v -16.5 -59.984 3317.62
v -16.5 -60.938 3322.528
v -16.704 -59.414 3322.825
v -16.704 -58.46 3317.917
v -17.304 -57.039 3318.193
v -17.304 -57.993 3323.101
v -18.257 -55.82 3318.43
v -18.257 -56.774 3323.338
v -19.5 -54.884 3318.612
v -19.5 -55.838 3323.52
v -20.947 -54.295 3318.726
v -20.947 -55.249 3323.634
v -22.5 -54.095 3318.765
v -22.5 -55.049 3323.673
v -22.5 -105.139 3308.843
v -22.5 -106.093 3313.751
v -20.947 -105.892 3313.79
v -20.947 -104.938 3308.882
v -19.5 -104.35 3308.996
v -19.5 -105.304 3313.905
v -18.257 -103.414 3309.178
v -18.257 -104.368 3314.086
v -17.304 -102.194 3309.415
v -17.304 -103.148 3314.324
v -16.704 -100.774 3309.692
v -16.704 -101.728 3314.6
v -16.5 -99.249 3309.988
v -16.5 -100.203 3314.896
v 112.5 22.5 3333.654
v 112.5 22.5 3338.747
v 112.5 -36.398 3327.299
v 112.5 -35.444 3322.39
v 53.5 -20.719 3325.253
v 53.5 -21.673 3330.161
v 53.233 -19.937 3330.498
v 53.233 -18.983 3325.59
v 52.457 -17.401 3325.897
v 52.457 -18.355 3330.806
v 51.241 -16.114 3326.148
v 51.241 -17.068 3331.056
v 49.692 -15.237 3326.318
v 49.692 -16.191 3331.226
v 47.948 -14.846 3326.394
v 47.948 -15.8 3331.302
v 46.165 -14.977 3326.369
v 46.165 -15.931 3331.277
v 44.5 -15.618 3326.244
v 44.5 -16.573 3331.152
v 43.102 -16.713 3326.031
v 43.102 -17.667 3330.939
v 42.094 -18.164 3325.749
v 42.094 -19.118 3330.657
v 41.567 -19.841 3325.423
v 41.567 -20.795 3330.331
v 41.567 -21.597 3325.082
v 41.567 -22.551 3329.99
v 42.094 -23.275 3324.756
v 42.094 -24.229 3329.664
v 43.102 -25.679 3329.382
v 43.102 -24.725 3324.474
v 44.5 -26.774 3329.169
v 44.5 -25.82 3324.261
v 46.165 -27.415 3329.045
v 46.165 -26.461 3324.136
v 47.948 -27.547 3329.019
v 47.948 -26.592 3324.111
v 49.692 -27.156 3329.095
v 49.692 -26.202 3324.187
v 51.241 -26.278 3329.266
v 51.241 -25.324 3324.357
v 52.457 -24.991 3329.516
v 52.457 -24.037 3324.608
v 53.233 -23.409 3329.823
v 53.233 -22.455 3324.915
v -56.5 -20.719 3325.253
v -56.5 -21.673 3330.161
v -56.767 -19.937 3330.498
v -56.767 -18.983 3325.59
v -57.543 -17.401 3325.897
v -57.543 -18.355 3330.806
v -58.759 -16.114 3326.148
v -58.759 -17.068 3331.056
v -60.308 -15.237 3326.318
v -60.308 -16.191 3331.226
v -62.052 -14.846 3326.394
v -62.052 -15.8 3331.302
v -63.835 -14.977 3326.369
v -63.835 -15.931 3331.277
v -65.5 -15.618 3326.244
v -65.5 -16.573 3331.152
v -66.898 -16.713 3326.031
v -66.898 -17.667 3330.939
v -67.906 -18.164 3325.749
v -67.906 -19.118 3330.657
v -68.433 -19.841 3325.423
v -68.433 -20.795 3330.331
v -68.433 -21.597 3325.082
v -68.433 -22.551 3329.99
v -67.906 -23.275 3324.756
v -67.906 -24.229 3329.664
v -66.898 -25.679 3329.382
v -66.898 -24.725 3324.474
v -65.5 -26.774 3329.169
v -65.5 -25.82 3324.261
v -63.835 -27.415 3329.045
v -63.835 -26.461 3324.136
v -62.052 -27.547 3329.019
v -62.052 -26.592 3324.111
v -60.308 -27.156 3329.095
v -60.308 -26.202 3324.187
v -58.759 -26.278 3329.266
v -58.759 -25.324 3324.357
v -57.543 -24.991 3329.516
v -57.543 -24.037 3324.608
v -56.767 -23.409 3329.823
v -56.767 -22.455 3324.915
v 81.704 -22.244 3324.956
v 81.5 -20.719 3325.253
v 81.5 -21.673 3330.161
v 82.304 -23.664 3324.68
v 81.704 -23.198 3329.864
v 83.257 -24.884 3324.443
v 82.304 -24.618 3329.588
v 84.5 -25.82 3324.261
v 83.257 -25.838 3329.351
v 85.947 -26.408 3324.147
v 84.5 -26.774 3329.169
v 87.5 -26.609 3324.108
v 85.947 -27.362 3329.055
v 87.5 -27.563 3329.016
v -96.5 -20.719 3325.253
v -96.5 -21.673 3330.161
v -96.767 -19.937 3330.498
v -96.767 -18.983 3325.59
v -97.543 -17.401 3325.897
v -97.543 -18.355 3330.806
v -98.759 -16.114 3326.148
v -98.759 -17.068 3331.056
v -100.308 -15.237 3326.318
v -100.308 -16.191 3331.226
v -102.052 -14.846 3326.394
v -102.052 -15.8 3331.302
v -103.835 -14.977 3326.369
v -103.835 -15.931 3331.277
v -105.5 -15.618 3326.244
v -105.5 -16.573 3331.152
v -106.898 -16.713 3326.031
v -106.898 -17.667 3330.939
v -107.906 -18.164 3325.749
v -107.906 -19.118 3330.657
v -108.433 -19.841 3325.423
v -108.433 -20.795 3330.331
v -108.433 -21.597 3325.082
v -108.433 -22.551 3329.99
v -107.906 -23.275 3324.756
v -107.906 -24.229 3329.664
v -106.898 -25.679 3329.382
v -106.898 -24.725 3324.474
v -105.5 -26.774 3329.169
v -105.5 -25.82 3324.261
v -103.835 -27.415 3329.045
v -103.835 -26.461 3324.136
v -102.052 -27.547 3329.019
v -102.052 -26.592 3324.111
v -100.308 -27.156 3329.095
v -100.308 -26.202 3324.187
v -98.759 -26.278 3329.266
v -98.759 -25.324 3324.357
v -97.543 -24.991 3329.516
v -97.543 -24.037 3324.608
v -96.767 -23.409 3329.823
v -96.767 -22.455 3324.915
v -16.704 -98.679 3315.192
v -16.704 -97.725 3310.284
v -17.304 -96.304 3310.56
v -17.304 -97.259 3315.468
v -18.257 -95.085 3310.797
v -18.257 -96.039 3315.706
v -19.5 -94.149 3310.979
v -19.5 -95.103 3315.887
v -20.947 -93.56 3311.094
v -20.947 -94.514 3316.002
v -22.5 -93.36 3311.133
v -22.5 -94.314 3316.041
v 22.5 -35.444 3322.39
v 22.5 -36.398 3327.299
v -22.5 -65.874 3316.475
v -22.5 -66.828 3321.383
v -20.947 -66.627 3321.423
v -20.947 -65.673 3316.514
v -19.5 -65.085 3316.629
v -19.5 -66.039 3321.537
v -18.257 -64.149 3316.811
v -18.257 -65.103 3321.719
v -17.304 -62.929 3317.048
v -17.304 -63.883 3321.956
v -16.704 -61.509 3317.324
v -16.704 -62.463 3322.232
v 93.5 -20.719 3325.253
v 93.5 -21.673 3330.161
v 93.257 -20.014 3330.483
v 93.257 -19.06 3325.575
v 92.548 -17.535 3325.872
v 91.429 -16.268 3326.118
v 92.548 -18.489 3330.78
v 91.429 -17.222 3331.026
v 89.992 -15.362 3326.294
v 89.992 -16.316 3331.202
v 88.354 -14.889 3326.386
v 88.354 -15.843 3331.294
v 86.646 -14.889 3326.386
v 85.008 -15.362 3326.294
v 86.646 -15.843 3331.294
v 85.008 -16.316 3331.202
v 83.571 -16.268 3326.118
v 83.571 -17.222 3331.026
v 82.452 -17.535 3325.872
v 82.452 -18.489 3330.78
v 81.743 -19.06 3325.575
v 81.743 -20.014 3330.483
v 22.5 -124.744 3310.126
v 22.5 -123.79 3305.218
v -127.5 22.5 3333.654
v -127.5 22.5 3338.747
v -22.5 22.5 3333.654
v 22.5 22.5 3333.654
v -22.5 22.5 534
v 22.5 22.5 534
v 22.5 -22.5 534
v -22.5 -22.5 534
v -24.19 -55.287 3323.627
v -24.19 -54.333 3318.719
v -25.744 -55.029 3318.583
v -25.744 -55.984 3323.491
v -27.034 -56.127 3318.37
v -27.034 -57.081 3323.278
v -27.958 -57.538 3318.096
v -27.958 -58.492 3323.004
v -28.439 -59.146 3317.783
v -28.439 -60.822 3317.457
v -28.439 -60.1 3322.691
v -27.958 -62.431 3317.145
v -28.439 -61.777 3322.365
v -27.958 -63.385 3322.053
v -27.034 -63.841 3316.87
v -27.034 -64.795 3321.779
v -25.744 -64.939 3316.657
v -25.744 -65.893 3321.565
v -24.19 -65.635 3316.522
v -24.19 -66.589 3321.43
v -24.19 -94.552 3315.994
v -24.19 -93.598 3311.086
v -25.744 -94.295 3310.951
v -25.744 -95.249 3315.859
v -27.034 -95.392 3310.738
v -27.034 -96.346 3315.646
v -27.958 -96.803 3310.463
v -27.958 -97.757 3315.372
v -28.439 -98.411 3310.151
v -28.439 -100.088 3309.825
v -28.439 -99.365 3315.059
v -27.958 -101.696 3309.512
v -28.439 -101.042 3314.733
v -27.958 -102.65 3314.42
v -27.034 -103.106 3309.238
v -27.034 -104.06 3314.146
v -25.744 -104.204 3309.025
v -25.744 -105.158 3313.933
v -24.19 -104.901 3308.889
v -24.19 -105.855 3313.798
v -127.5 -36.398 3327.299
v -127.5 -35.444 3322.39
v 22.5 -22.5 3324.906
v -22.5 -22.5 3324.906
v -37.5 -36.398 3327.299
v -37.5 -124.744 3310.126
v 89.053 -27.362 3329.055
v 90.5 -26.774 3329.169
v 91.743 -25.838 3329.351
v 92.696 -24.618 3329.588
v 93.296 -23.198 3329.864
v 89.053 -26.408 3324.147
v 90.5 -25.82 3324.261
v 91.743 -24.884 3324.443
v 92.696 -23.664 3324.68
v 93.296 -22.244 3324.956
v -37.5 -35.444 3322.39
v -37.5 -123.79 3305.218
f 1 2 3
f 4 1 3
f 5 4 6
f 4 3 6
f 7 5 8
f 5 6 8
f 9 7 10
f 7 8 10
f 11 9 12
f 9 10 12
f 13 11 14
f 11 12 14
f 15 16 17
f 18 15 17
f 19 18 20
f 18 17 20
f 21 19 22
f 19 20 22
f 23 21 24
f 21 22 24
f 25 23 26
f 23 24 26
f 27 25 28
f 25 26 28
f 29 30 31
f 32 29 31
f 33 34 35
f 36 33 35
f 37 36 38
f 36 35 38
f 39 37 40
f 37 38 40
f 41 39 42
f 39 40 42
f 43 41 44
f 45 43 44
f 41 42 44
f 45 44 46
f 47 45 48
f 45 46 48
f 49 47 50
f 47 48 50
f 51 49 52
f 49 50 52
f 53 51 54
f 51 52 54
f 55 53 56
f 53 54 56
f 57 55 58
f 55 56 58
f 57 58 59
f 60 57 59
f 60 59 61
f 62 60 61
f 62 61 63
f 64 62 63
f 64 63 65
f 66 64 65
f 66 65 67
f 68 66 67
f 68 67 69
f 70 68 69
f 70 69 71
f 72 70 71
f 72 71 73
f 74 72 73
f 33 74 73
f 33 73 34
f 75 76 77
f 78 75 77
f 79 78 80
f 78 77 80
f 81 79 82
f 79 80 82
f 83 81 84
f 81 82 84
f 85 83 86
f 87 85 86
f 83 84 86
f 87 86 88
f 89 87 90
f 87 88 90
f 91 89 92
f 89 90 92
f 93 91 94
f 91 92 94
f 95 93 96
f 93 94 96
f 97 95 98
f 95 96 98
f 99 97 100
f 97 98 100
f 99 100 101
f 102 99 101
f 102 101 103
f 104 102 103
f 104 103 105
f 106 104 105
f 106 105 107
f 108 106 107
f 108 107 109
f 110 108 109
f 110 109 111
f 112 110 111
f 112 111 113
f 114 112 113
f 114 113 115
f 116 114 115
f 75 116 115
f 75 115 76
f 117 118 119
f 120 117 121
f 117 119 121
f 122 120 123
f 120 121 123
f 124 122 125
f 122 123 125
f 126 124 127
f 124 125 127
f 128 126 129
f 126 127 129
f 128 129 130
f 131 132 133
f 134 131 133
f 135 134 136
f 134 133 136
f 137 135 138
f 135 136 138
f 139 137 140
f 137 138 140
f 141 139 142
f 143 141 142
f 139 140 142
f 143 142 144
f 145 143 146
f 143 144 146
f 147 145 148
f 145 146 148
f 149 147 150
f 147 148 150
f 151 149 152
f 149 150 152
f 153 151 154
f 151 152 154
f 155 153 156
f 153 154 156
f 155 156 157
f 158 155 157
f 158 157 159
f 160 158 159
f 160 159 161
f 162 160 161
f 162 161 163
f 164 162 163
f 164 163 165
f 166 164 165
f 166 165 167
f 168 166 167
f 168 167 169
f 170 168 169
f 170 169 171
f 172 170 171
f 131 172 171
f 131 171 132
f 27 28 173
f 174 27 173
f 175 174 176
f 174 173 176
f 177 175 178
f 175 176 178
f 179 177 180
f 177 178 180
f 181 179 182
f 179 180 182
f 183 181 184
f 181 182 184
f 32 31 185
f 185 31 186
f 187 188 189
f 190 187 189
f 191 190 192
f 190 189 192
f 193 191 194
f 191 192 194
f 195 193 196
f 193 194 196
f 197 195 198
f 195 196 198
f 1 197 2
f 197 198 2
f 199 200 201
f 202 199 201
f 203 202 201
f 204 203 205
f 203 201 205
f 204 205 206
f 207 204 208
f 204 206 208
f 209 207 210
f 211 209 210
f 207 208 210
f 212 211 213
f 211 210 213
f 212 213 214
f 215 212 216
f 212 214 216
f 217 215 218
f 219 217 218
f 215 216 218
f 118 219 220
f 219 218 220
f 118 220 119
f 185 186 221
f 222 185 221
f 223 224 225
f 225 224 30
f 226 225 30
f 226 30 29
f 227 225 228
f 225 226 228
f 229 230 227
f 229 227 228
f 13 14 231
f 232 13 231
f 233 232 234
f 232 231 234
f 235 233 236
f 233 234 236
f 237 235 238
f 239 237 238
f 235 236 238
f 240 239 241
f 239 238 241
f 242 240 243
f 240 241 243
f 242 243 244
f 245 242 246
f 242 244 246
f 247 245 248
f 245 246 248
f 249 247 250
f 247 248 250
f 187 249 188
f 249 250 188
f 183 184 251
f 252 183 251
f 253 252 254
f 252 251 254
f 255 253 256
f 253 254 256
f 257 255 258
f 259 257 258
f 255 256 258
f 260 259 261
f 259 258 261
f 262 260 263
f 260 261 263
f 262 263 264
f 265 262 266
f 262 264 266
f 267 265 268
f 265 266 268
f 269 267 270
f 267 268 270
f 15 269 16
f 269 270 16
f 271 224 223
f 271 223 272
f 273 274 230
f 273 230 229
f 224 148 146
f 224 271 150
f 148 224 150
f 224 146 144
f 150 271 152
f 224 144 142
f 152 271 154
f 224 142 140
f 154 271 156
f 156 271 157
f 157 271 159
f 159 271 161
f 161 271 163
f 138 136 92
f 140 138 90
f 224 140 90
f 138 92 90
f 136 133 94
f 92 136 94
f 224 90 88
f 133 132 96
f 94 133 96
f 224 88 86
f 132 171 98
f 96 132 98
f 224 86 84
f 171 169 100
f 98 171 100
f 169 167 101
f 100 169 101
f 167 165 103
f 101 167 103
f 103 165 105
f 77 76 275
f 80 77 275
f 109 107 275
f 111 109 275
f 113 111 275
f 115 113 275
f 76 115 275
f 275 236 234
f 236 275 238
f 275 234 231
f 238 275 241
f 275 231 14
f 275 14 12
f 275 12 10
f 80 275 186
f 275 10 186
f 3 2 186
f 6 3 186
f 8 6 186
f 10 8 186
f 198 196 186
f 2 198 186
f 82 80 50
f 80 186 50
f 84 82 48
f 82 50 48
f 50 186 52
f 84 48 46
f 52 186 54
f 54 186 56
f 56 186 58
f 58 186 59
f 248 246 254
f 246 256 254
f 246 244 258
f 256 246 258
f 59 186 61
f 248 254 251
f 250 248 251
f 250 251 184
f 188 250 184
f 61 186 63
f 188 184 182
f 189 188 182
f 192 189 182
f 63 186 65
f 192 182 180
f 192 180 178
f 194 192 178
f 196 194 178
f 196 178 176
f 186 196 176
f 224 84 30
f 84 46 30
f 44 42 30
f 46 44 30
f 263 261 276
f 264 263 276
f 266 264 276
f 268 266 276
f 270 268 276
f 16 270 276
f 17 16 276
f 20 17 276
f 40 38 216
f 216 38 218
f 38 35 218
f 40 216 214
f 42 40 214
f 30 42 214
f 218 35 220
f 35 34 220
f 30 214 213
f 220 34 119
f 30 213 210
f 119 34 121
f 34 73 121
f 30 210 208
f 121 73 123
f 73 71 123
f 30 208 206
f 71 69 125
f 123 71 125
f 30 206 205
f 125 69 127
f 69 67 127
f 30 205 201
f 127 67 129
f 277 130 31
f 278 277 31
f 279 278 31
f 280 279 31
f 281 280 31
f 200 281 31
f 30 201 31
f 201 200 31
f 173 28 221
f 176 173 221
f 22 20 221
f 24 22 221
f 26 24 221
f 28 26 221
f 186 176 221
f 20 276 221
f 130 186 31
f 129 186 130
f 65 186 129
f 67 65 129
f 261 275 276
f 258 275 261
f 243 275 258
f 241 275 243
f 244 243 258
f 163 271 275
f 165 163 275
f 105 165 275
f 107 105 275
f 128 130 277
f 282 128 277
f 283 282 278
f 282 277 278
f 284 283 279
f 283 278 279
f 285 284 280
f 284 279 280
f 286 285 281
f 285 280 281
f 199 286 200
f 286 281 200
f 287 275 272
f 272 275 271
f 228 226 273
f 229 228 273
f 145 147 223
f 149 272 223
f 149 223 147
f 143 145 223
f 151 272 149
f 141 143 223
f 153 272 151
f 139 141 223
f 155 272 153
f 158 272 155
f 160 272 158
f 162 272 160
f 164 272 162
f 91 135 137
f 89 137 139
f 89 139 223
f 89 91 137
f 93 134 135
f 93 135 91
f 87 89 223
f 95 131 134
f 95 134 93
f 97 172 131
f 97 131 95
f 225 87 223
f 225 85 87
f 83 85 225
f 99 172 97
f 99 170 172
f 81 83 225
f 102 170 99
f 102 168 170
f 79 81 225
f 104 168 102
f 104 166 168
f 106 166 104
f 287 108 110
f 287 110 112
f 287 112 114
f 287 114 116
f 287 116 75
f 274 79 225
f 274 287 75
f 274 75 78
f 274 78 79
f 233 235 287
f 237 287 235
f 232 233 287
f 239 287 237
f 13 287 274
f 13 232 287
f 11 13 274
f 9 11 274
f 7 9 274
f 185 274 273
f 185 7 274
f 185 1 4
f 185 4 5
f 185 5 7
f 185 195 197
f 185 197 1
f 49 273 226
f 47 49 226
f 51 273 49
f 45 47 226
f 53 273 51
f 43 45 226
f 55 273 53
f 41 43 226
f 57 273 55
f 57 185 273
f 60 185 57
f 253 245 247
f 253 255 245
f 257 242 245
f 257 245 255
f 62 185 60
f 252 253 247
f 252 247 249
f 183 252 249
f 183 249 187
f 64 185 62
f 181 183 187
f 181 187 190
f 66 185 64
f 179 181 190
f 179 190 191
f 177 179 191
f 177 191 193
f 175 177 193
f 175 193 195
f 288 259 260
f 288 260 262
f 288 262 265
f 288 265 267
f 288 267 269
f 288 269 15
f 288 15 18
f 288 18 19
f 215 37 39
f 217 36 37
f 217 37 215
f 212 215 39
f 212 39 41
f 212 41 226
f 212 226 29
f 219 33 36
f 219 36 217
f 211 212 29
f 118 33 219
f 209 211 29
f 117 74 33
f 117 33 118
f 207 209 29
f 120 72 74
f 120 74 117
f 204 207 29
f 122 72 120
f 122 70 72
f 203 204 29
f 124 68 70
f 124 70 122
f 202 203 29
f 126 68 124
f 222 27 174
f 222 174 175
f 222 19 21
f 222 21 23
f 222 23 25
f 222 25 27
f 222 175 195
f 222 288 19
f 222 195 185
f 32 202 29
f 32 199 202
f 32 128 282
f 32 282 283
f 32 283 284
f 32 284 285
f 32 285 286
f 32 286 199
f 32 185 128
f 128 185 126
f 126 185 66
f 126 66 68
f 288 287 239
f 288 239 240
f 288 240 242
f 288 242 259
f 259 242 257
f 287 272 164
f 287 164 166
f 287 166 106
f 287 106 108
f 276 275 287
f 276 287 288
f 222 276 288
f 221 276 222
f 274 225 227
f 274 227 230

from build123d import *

# Parameters (mm, degrees)
F0_W      = 45
F0_H      = 45
F1_DEPTH  = 3330
F6_W      = 45
F6_H      = 45.842251273
F7_DEPTH  = 25
F8_W      = 60
F8_H      = 60
F8_W_2    = 90
F8_H_2    = 90
F9_DEPTH  = 5
F10_R     = 6
F11_DEPTH = 25
F12_W     = 150
F12_H     = 4.7702248844
F13_DEPTH = 3358.6871623993
F15_DEPTH = 106.2
F16_W     = 45
F16_H     = 45
F17_DEPTH = 534


with BuildPart() as f1:
    # F0 (on Top) → F1 (new body)
    with BuildSketch(Plane.XY):
        Rectangle(F0_W, F0_H)
    extrude(amount=F1_DEPTH)

    # F6 (on face) → F7 (join)
    with BuildSketch(Plane(origin=(0, -624.5391596736, 3212.9754420296), x_dir=(1, 0, 0), z_dir=(0, 0.1908089954, -0.9816271834))):
        with Locations((0, -636.2284686128)):
            Rectangle(F6_W, F6_H)
    extrude(amount=F7_DEPTH)

    # F8 (on face) → F9 (join)
    with BuildSketch(Plane(origin=(0, -624.5391596736, 3212.9754420296), x_dir=(1, 0, 0), z_dir=(0, 0.1908089954, -0.9816271834))):
        with Locations((-7.5, -629.1495942493)):
            Rectangle(F8_W, F8_H)
        with Locations((-82.5, -629.1495942493)):
            Rectangle(F8_W_2, F8_H)
        with Locations((67.5, -629.1495942493)):
            Rectangle(F8_W_2, F8_H)
        with Locations((-7.5, -554.1495942493)):
            Rectangle(F8_W, F8_H_2)
    extrude(amount=F9_DEPTH)

    # F10 (on face) → F11 (cut)
    with BuildSketch(Plane(origin=(0, -624.5391596736, 3212.9754420296), x_dir=(1, 0, 0), z_dir=(0, -0.1908089954, 0.9816271834))):
        with BuildLine():
            ThreePointArc((81.5, 614.1495942493), (83.2573593129, 609.9069535622), (87.5, 608.1495942493))
            Line((87.5, 608.1495942493), (87.5, 614.1495942493))
            Line((87.5, 614.1495942493), (81.5, 614.1495942493))
        make_face()
        with Locations((47.5, 614.1495942493)):
            Circle(F10_R)
        with BuildLine():
            Line((87.5, 614.1495942493), (87.5, 608.1495942493))
            ThreePointArc((87.5, 608.1495942493), (91.7426406871, 609.9069535622), (93.5, 614.1495942493))
            ThreePointArc((93.5, 614.1495942493), (87.5, 620.1495942493), (81.5, 614.1495942493))
            Line((81.5, 614.1495942493), (87.5, 614.1495942493))
        make_face()
        with BuildLine():
            ThreePointArc((-22.5, 540.1495942493), (-28.5, 534.1495942493), (-22.5, 528.1495942493))
            Line((-22.5, 528.1495942493), (-22.5, 540.1495942493))
        make_face()
        with BuildLine():
            ThreePointArc((-22.5, 580.1495942493), (-28.5, 574.1495942493), (-22.5, 568.1495942493))
            Line((-22.5, 568.1495942493), (-22.5, 580.1495942493))
        make_face()
        with BuildLine():
            Line((-22.5, 580.1495942493), (-22.5, 568.1495942493))
            ThreePointArc((-22.5, 568.1495942493), (-18.2573593129, 569.9069535622), (-16.5, 574.1495942493))
            ThreePointArc((-16.5, 574.1495942493), (-18.2573593129, 578.3922349364), (-22.5, 580.1495942493))
        make_face()
        with BuildLine():
            Line((-22.5, 540.1495942493), (-22.5, 528.1495942493))
            ThreePointArc((-22.5, 528.1495942493), (-18.2573593129, 529.9069535622), (-16.5, 534.1495942493))
            ThreePointArc((-16.5, 534.1495942493), (-18.2573593129, 538.3922349364), (-22.5, 540.1495942493))
        make_face()
        with Locations((-62.5, 614.1495942493)):
            Circle(F10_R)
        with Locations((-102.5, 614.1495942493)):
            Circle(F10_R)
    extrude(amount=-F11_DEPTH, mode=Mode.SUBTRACT)

    # F12 (on Top) → F13 (cut)
    with BuildSketch(Plane.XY):
        with Locations((52.5, 24.8851124422)):
            Rectangle(F12_W, F12_H)
    extrude(amount=F13_DEPTH, mode=Mode.SUBTRACT)

    # F14 (on face) → F15 (cut)
    with BuildSketch(Plane.YZ.offset(-22.5)):
        Polygon((22.5, 3338.7471139112), (22.5, 3333.6535304364), (23.4540449769, 3333.838977994), align=None)
    extrude(amount=-F15_DEPTH, mode=Mode.SUBTRACT)

    # F16 (on face) → F17 (cut)
    with BuildSketch(Plane(origin=(0, 0, 0), x_dir=(1, 0, 0), z_dir=(0, 0, -1))):
        Rectangle(F16_W, F16_H)
    extrude(amount=-F17_DEPTH, mode=Mode.SUBTRACT)


solid = f1.part
